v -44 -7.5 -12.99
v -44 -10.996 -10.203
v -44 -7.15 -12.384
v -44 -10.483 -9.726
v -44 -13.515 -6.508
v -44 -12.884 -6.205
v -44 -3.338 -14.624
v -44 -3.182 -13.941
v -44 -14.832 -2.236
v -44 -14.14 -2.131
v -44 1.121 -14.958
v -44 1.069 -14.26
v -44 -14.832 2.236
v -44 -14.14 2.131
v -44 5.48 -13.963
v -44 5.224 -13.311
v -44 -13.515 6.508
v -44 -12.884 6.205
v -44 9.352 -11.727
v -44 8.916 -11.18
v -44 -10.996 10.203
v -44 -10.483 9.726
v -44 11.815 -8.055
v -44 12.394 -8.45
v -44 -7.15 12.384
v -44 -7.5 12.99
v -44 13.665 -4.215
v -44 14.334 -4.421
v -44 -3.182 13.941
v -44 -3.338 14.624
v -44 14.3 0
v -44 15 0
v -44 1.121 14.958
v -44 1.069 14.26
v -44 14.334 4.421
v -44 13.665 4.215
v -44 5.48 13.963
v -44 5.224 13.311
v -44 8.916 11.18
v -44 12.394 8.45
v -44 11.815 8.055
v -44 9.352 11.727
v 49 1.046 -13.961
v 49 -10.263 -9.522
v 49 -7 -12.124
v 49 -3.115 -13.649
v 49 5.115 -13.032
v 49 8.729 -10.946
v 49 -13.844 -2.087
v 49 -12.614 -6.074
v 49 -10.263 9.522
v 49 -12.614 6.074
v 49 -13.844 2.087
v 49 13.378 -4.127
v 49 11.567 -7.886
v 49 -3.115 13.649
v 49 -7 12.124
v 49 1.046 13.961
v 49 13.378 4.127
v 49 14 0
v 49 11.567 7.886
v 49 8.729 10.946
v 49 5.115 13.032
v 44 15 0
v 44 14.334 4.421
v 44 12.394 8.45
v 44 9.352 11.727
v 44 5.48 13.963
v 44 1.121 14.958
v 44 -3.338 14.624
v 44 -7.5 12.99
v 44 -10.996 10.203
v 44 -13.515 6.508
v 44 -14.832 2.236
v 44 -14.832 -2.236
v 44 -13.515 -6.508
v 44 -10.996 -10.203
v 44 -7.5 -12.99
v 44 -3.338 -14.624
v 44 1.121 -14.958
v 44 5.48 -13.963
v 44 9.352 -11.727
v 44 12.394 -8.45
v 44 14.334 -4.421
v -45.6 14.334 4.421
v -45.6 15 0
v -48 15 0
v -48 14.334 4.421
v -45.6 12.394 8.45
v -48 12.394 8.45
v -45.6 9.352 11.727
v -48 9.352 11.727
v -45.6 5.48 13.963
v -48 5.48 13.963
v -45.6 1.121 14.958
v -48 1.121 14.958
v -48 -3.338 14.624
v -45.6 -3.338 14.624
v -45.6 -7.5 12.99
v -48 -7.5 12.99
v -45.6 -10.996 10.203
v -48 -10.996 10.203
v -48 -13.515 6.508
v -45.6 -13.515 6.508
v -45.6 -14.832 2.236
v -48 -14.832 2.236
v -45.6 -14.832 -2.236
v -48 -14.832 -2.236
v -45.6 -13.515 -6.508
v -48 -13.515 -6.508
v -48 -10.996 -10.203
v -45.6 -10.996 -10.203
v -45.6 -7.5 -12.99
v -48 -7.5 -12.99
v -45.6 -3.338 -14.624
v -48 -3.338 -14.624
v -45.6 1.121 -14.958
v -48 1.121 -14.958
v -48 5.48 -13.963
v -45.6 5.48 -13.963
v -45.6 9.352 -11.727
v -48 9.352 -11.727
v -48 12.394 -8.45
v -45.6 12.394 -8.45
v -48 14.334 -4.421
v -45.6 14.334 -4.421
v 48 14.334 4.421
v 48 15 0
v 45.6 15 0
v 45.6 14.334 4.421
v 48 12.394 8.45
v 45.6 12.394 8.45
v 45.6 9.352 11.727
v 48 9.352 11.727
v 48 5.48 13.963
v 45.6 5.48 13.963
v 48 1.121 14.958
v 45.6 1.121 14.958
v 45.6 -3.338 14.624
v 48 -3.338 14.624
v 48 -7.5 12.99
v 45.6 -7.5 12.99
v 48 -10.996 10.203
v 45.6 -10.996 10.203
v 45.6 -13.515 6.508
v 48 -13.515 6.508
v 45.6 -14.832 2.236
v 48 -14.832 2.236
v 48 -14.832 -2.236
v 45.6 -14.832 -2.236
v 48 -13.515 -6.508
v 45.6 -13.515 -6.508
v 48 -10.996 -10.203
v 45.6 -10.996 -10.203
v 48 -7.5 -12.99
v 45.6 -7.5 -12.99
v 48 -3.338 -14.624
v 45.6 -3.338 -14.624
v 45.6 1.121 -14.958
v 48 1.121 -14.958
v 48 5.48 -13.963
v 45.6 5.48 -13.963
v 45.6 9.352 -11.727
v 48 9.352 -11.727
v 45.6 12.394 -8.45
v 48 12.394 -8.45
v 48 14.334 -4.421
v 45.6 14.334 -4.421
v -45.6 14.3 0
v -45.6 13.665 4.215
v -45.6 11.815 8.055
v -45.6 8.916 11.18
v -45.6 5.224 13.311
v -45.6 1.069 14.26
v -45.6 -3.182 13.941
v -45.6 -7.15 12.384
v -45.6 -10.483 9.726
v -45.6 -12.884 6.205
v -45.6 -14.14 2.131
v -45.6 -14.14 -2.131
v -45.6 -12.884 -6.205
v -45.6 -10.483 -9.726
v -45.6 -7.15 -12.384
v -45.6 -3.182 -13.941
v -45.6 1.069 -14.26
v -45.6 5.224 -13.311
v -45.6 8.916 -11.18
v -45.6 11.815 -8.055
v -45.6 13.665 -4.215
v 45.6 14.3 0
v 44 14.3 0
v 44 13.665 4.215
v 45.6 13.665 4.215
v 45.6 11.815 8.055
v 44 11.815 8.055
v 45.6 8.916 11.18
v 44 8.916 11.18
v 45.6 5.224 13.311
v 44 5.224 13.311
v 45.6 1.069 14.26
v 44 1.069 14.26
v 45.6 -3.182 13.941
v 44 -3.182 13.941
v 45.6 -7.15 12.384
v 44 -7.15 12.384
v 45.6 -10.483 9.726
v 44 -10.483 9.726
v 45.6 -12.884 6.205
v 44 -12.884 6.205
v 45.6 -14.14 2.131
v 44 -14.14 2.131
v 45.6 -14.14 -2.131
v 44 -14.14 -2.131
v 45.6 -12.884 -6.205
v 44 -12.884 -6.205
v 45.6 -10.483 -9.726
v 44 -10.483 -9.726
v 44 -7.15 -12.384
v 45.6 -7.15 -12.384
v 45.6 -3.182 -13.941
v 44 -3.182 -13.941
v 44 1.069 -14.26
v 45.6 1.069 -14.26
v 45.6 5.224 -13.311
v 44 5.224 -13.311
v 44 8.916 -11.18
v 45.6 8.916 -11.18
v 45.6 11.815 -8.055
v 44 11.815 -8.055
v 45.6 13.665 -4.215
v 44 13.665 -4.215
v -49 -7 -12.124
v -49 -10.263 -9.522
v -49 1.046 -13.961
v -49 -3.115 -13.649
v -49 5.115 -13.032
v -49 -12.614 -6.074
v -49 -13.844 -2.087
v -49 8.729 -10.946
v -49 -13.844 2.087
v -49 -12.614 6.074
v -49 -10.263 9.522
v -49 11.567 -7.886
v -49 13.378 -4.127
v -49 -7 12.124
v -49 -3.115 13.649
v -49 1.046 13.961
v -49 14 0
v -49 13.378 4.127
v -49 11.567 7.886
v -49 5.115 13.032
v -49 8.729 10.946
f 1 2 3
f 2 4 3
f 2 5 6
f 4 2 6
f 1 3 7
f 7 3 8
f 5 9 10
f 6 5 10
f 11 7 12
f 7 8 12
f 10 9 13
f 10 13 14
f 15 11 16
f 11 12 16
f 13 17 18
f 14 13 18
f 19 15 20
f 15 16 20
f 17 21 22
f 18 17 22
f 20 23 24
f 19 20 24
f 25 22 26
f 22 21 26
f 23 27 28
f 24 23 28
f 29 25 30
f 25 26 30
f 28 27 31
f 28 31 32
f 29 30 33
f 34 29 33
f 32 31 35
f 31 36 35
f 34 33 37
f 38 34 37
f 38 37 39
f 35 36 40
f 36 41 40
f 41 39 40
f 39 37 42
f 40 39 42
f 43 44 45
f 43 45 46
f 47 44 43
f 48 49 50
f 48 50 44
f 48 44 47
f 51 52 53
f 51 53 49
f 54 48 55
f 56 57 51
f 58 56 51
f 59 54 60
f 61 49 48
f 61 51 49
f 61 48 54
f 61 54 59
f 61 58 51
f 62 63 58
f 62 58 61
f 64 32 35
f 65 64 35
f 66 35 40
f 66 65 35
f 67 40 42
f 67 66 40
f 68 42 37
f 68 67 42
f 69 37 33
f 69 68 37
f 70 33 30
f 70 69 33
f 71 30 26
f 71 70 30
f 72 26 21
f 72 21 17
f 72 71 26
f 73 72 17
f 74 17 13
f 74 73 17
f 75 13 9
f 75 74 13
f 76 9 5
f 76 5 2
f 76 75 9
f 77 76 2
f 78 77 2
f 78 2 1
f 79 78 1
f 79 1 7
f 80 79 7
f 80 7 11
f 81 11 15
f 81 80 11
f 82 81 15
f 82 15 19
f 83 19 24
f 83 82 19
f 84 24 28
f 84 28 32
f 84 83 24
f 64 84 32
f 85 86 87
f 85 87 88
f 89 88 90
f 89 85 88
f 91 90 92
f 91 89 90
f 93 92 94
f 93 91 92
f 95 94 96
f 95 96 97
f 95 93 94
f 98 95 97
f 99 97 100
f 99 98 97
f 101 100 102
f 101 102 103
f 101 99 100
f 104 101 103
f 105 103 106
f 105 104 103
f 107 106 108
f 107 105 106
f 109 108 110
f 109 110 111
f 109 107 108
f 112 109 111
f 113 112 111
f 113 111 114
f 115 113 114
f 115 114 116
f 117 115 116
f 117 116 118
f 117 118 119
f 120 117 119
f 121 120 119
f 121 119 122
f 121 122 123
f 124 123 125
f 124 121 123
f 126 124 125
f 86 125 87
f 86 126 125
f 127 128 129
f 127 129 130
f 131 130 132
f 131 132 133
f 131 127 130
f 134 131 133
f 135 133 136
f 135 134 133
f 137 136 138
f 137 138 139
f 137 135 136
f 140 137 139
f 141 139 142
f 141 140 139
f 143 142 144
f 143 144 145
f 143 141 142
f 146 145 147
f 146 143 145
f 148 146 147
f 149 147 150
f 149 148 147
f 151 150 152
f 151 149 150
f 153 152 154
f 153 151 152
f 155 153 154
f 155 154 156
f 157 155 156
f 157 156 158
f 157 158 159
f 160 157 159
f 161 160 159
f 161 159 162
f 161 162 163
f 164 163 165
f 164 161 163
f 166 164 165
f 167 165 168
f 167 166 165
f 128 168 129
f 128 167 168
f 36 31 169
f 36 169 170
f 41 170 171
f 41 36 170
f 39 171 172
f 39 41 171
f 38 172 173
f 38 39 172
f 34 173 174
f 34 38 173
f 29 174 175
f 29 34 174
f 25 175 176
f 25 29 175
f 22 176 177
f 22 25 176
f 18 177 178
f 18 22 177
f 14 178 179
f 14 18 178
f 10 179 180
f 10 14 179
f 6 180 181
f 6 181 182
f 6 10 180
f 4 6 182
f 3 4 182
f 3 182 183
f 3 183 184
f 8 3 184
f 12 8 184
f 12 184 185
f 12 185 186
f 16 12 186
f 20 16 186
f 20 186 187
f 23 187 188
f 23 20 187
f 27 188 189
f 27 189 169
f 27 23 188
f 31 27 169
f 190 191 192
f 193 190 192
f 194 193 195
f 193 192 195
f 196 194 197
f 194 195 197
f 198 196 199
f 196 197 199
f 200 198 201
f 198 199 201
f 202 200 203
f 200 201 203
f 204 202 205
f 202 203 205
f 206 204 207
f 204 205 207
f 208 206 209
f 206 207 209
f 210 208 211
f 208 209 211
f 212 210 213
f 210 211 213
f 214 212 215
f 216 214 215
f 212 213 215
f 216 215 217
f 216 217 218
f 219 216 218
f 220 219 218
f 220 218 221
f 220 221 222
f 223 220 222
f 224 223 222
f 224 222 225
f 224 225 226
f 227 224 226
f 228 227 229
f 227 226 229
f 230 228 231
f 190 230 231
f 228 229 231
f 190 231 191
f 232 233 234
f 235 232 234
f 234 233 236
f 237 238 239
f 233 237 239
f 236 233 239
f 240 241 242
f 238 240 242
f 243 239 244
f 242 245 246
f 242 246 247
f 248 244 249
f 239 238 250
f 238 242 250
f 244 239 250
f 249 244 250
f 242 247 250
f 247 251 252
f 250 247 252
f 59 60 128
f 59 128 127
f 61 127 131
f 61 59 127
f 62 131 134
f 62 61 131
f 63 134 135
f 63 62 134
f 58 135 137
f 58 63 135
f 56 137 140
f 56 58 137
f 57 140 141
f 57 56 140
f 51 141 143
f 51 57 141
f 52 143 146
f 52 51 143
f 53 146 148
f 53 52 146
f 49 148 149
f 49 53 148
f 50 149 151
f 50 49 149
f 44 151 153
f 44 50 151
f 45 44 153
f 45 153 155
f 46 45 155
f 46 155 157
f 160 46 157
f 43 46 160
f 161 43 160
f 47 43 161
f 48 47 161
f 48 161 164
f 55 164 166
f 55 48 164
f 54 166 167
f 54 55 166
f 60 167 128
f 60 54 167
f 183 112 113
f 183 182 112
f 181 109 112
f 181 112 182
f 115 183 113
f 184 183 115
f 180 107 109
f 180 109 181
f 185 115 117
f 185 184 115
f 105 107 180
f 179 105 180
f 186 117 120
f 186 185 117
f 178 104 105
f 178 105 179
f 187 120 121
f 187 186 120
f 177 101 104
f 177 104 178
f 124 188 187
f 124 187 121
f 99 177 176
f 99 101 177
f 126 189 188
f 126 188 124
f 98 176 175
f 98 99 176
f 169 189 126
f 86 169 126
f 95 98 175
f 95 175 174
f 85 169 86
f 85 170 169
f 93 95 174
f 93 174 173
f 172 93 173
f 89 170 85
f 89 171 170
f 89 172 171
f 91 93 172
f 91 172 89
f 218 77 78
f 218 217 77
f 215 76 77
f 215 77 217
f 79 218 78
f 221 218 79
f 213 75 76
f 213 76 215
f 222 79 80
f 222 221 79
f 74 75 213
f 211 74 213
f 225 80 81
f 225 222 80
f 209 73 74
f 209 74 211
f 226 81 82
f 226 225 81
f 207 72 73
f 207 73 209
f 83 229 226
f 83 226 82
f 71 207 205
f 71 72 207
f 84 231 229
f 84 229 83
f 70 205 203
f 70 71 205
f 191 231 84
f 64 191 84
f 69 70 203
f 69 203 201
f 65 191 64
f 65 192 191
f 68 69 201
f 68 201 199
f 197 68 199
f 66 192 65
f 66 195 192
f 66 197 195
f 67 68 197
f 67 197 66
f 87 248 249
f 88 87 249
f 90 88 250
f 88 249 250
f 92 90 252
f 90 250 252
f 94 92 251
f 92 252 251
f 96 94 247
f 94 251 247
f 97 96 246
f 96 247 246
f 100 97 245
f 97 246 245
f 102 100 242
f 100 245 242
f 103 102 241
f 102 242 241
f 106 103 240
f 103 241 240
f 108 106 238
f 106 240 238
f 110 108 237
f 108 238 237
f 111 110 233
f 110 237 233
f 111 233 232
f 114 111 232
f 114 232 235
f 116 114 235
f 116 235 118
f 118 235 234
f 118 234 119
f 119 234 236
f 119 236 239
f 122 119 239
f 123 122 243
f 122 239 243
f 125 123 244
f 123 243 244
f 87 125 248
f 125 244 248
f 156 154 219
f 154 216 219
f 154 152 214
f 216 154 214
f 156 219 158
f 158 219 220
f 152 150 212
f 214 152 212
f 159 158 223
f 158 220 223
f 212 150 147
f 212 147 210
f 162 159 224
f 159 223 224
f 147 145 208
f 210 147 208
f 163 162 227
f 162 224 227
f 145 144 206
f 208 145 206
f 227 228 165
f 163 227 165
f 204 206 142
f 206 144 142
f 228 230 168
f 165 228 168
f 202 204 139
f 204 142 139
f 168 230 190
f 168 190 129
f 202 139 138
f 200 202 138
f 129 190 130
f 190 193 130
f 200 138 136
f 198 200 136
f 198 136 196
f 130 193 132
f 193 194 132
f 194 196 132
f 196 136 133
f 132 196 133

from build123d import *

# Parameters (mm, degrees)
F0_R     = 15
F1_DEPTH = 49
F3_R     = 17.9592935662
F3_R_2   = 14.3
F4_DEPTH = 1.6
F5_SIZE  = 1


# Not quite as in the source:
# - a pattern or mirror of a feature is missing from the dataset's text; its kind, count and spacing are read off the source's solid


with BuildPart() as f1:
    # F0 (on Right) → F1 (new body, symmetric)
    with BuildSketch(Plane.YZ):
        Circle(F0_R)
    extrude(amount=F1_DEPTH, both=True)

    # F3 (on offset) → F4 (cut)
    with BuildSketch(Plane.YZ.offset(44)):
        Circle(F3_R)
        Circle(F3_R_2, mode=Mode.SUBTRACT)
    f4 = extrude(amount=F4_DEPTH, mode=Mode.SUBTRACT)

    # F4_copies: F4 across plane
    add(f4.mirror(Plane(origin=(0, 0, 0), x_dir=(0, 0, -1), z_dir=(-1, 0, 0))), mode=Mode.SUBTRACT)

    # F5
    f5_edges = [f1.edges().sort_by_distance(p)[0] for p in [
        (-49, -15, 0),
        (49, -15, 0),
    ]]
    chamfer(f5_edges, length=F5_SIZE)


solid = f1.part
